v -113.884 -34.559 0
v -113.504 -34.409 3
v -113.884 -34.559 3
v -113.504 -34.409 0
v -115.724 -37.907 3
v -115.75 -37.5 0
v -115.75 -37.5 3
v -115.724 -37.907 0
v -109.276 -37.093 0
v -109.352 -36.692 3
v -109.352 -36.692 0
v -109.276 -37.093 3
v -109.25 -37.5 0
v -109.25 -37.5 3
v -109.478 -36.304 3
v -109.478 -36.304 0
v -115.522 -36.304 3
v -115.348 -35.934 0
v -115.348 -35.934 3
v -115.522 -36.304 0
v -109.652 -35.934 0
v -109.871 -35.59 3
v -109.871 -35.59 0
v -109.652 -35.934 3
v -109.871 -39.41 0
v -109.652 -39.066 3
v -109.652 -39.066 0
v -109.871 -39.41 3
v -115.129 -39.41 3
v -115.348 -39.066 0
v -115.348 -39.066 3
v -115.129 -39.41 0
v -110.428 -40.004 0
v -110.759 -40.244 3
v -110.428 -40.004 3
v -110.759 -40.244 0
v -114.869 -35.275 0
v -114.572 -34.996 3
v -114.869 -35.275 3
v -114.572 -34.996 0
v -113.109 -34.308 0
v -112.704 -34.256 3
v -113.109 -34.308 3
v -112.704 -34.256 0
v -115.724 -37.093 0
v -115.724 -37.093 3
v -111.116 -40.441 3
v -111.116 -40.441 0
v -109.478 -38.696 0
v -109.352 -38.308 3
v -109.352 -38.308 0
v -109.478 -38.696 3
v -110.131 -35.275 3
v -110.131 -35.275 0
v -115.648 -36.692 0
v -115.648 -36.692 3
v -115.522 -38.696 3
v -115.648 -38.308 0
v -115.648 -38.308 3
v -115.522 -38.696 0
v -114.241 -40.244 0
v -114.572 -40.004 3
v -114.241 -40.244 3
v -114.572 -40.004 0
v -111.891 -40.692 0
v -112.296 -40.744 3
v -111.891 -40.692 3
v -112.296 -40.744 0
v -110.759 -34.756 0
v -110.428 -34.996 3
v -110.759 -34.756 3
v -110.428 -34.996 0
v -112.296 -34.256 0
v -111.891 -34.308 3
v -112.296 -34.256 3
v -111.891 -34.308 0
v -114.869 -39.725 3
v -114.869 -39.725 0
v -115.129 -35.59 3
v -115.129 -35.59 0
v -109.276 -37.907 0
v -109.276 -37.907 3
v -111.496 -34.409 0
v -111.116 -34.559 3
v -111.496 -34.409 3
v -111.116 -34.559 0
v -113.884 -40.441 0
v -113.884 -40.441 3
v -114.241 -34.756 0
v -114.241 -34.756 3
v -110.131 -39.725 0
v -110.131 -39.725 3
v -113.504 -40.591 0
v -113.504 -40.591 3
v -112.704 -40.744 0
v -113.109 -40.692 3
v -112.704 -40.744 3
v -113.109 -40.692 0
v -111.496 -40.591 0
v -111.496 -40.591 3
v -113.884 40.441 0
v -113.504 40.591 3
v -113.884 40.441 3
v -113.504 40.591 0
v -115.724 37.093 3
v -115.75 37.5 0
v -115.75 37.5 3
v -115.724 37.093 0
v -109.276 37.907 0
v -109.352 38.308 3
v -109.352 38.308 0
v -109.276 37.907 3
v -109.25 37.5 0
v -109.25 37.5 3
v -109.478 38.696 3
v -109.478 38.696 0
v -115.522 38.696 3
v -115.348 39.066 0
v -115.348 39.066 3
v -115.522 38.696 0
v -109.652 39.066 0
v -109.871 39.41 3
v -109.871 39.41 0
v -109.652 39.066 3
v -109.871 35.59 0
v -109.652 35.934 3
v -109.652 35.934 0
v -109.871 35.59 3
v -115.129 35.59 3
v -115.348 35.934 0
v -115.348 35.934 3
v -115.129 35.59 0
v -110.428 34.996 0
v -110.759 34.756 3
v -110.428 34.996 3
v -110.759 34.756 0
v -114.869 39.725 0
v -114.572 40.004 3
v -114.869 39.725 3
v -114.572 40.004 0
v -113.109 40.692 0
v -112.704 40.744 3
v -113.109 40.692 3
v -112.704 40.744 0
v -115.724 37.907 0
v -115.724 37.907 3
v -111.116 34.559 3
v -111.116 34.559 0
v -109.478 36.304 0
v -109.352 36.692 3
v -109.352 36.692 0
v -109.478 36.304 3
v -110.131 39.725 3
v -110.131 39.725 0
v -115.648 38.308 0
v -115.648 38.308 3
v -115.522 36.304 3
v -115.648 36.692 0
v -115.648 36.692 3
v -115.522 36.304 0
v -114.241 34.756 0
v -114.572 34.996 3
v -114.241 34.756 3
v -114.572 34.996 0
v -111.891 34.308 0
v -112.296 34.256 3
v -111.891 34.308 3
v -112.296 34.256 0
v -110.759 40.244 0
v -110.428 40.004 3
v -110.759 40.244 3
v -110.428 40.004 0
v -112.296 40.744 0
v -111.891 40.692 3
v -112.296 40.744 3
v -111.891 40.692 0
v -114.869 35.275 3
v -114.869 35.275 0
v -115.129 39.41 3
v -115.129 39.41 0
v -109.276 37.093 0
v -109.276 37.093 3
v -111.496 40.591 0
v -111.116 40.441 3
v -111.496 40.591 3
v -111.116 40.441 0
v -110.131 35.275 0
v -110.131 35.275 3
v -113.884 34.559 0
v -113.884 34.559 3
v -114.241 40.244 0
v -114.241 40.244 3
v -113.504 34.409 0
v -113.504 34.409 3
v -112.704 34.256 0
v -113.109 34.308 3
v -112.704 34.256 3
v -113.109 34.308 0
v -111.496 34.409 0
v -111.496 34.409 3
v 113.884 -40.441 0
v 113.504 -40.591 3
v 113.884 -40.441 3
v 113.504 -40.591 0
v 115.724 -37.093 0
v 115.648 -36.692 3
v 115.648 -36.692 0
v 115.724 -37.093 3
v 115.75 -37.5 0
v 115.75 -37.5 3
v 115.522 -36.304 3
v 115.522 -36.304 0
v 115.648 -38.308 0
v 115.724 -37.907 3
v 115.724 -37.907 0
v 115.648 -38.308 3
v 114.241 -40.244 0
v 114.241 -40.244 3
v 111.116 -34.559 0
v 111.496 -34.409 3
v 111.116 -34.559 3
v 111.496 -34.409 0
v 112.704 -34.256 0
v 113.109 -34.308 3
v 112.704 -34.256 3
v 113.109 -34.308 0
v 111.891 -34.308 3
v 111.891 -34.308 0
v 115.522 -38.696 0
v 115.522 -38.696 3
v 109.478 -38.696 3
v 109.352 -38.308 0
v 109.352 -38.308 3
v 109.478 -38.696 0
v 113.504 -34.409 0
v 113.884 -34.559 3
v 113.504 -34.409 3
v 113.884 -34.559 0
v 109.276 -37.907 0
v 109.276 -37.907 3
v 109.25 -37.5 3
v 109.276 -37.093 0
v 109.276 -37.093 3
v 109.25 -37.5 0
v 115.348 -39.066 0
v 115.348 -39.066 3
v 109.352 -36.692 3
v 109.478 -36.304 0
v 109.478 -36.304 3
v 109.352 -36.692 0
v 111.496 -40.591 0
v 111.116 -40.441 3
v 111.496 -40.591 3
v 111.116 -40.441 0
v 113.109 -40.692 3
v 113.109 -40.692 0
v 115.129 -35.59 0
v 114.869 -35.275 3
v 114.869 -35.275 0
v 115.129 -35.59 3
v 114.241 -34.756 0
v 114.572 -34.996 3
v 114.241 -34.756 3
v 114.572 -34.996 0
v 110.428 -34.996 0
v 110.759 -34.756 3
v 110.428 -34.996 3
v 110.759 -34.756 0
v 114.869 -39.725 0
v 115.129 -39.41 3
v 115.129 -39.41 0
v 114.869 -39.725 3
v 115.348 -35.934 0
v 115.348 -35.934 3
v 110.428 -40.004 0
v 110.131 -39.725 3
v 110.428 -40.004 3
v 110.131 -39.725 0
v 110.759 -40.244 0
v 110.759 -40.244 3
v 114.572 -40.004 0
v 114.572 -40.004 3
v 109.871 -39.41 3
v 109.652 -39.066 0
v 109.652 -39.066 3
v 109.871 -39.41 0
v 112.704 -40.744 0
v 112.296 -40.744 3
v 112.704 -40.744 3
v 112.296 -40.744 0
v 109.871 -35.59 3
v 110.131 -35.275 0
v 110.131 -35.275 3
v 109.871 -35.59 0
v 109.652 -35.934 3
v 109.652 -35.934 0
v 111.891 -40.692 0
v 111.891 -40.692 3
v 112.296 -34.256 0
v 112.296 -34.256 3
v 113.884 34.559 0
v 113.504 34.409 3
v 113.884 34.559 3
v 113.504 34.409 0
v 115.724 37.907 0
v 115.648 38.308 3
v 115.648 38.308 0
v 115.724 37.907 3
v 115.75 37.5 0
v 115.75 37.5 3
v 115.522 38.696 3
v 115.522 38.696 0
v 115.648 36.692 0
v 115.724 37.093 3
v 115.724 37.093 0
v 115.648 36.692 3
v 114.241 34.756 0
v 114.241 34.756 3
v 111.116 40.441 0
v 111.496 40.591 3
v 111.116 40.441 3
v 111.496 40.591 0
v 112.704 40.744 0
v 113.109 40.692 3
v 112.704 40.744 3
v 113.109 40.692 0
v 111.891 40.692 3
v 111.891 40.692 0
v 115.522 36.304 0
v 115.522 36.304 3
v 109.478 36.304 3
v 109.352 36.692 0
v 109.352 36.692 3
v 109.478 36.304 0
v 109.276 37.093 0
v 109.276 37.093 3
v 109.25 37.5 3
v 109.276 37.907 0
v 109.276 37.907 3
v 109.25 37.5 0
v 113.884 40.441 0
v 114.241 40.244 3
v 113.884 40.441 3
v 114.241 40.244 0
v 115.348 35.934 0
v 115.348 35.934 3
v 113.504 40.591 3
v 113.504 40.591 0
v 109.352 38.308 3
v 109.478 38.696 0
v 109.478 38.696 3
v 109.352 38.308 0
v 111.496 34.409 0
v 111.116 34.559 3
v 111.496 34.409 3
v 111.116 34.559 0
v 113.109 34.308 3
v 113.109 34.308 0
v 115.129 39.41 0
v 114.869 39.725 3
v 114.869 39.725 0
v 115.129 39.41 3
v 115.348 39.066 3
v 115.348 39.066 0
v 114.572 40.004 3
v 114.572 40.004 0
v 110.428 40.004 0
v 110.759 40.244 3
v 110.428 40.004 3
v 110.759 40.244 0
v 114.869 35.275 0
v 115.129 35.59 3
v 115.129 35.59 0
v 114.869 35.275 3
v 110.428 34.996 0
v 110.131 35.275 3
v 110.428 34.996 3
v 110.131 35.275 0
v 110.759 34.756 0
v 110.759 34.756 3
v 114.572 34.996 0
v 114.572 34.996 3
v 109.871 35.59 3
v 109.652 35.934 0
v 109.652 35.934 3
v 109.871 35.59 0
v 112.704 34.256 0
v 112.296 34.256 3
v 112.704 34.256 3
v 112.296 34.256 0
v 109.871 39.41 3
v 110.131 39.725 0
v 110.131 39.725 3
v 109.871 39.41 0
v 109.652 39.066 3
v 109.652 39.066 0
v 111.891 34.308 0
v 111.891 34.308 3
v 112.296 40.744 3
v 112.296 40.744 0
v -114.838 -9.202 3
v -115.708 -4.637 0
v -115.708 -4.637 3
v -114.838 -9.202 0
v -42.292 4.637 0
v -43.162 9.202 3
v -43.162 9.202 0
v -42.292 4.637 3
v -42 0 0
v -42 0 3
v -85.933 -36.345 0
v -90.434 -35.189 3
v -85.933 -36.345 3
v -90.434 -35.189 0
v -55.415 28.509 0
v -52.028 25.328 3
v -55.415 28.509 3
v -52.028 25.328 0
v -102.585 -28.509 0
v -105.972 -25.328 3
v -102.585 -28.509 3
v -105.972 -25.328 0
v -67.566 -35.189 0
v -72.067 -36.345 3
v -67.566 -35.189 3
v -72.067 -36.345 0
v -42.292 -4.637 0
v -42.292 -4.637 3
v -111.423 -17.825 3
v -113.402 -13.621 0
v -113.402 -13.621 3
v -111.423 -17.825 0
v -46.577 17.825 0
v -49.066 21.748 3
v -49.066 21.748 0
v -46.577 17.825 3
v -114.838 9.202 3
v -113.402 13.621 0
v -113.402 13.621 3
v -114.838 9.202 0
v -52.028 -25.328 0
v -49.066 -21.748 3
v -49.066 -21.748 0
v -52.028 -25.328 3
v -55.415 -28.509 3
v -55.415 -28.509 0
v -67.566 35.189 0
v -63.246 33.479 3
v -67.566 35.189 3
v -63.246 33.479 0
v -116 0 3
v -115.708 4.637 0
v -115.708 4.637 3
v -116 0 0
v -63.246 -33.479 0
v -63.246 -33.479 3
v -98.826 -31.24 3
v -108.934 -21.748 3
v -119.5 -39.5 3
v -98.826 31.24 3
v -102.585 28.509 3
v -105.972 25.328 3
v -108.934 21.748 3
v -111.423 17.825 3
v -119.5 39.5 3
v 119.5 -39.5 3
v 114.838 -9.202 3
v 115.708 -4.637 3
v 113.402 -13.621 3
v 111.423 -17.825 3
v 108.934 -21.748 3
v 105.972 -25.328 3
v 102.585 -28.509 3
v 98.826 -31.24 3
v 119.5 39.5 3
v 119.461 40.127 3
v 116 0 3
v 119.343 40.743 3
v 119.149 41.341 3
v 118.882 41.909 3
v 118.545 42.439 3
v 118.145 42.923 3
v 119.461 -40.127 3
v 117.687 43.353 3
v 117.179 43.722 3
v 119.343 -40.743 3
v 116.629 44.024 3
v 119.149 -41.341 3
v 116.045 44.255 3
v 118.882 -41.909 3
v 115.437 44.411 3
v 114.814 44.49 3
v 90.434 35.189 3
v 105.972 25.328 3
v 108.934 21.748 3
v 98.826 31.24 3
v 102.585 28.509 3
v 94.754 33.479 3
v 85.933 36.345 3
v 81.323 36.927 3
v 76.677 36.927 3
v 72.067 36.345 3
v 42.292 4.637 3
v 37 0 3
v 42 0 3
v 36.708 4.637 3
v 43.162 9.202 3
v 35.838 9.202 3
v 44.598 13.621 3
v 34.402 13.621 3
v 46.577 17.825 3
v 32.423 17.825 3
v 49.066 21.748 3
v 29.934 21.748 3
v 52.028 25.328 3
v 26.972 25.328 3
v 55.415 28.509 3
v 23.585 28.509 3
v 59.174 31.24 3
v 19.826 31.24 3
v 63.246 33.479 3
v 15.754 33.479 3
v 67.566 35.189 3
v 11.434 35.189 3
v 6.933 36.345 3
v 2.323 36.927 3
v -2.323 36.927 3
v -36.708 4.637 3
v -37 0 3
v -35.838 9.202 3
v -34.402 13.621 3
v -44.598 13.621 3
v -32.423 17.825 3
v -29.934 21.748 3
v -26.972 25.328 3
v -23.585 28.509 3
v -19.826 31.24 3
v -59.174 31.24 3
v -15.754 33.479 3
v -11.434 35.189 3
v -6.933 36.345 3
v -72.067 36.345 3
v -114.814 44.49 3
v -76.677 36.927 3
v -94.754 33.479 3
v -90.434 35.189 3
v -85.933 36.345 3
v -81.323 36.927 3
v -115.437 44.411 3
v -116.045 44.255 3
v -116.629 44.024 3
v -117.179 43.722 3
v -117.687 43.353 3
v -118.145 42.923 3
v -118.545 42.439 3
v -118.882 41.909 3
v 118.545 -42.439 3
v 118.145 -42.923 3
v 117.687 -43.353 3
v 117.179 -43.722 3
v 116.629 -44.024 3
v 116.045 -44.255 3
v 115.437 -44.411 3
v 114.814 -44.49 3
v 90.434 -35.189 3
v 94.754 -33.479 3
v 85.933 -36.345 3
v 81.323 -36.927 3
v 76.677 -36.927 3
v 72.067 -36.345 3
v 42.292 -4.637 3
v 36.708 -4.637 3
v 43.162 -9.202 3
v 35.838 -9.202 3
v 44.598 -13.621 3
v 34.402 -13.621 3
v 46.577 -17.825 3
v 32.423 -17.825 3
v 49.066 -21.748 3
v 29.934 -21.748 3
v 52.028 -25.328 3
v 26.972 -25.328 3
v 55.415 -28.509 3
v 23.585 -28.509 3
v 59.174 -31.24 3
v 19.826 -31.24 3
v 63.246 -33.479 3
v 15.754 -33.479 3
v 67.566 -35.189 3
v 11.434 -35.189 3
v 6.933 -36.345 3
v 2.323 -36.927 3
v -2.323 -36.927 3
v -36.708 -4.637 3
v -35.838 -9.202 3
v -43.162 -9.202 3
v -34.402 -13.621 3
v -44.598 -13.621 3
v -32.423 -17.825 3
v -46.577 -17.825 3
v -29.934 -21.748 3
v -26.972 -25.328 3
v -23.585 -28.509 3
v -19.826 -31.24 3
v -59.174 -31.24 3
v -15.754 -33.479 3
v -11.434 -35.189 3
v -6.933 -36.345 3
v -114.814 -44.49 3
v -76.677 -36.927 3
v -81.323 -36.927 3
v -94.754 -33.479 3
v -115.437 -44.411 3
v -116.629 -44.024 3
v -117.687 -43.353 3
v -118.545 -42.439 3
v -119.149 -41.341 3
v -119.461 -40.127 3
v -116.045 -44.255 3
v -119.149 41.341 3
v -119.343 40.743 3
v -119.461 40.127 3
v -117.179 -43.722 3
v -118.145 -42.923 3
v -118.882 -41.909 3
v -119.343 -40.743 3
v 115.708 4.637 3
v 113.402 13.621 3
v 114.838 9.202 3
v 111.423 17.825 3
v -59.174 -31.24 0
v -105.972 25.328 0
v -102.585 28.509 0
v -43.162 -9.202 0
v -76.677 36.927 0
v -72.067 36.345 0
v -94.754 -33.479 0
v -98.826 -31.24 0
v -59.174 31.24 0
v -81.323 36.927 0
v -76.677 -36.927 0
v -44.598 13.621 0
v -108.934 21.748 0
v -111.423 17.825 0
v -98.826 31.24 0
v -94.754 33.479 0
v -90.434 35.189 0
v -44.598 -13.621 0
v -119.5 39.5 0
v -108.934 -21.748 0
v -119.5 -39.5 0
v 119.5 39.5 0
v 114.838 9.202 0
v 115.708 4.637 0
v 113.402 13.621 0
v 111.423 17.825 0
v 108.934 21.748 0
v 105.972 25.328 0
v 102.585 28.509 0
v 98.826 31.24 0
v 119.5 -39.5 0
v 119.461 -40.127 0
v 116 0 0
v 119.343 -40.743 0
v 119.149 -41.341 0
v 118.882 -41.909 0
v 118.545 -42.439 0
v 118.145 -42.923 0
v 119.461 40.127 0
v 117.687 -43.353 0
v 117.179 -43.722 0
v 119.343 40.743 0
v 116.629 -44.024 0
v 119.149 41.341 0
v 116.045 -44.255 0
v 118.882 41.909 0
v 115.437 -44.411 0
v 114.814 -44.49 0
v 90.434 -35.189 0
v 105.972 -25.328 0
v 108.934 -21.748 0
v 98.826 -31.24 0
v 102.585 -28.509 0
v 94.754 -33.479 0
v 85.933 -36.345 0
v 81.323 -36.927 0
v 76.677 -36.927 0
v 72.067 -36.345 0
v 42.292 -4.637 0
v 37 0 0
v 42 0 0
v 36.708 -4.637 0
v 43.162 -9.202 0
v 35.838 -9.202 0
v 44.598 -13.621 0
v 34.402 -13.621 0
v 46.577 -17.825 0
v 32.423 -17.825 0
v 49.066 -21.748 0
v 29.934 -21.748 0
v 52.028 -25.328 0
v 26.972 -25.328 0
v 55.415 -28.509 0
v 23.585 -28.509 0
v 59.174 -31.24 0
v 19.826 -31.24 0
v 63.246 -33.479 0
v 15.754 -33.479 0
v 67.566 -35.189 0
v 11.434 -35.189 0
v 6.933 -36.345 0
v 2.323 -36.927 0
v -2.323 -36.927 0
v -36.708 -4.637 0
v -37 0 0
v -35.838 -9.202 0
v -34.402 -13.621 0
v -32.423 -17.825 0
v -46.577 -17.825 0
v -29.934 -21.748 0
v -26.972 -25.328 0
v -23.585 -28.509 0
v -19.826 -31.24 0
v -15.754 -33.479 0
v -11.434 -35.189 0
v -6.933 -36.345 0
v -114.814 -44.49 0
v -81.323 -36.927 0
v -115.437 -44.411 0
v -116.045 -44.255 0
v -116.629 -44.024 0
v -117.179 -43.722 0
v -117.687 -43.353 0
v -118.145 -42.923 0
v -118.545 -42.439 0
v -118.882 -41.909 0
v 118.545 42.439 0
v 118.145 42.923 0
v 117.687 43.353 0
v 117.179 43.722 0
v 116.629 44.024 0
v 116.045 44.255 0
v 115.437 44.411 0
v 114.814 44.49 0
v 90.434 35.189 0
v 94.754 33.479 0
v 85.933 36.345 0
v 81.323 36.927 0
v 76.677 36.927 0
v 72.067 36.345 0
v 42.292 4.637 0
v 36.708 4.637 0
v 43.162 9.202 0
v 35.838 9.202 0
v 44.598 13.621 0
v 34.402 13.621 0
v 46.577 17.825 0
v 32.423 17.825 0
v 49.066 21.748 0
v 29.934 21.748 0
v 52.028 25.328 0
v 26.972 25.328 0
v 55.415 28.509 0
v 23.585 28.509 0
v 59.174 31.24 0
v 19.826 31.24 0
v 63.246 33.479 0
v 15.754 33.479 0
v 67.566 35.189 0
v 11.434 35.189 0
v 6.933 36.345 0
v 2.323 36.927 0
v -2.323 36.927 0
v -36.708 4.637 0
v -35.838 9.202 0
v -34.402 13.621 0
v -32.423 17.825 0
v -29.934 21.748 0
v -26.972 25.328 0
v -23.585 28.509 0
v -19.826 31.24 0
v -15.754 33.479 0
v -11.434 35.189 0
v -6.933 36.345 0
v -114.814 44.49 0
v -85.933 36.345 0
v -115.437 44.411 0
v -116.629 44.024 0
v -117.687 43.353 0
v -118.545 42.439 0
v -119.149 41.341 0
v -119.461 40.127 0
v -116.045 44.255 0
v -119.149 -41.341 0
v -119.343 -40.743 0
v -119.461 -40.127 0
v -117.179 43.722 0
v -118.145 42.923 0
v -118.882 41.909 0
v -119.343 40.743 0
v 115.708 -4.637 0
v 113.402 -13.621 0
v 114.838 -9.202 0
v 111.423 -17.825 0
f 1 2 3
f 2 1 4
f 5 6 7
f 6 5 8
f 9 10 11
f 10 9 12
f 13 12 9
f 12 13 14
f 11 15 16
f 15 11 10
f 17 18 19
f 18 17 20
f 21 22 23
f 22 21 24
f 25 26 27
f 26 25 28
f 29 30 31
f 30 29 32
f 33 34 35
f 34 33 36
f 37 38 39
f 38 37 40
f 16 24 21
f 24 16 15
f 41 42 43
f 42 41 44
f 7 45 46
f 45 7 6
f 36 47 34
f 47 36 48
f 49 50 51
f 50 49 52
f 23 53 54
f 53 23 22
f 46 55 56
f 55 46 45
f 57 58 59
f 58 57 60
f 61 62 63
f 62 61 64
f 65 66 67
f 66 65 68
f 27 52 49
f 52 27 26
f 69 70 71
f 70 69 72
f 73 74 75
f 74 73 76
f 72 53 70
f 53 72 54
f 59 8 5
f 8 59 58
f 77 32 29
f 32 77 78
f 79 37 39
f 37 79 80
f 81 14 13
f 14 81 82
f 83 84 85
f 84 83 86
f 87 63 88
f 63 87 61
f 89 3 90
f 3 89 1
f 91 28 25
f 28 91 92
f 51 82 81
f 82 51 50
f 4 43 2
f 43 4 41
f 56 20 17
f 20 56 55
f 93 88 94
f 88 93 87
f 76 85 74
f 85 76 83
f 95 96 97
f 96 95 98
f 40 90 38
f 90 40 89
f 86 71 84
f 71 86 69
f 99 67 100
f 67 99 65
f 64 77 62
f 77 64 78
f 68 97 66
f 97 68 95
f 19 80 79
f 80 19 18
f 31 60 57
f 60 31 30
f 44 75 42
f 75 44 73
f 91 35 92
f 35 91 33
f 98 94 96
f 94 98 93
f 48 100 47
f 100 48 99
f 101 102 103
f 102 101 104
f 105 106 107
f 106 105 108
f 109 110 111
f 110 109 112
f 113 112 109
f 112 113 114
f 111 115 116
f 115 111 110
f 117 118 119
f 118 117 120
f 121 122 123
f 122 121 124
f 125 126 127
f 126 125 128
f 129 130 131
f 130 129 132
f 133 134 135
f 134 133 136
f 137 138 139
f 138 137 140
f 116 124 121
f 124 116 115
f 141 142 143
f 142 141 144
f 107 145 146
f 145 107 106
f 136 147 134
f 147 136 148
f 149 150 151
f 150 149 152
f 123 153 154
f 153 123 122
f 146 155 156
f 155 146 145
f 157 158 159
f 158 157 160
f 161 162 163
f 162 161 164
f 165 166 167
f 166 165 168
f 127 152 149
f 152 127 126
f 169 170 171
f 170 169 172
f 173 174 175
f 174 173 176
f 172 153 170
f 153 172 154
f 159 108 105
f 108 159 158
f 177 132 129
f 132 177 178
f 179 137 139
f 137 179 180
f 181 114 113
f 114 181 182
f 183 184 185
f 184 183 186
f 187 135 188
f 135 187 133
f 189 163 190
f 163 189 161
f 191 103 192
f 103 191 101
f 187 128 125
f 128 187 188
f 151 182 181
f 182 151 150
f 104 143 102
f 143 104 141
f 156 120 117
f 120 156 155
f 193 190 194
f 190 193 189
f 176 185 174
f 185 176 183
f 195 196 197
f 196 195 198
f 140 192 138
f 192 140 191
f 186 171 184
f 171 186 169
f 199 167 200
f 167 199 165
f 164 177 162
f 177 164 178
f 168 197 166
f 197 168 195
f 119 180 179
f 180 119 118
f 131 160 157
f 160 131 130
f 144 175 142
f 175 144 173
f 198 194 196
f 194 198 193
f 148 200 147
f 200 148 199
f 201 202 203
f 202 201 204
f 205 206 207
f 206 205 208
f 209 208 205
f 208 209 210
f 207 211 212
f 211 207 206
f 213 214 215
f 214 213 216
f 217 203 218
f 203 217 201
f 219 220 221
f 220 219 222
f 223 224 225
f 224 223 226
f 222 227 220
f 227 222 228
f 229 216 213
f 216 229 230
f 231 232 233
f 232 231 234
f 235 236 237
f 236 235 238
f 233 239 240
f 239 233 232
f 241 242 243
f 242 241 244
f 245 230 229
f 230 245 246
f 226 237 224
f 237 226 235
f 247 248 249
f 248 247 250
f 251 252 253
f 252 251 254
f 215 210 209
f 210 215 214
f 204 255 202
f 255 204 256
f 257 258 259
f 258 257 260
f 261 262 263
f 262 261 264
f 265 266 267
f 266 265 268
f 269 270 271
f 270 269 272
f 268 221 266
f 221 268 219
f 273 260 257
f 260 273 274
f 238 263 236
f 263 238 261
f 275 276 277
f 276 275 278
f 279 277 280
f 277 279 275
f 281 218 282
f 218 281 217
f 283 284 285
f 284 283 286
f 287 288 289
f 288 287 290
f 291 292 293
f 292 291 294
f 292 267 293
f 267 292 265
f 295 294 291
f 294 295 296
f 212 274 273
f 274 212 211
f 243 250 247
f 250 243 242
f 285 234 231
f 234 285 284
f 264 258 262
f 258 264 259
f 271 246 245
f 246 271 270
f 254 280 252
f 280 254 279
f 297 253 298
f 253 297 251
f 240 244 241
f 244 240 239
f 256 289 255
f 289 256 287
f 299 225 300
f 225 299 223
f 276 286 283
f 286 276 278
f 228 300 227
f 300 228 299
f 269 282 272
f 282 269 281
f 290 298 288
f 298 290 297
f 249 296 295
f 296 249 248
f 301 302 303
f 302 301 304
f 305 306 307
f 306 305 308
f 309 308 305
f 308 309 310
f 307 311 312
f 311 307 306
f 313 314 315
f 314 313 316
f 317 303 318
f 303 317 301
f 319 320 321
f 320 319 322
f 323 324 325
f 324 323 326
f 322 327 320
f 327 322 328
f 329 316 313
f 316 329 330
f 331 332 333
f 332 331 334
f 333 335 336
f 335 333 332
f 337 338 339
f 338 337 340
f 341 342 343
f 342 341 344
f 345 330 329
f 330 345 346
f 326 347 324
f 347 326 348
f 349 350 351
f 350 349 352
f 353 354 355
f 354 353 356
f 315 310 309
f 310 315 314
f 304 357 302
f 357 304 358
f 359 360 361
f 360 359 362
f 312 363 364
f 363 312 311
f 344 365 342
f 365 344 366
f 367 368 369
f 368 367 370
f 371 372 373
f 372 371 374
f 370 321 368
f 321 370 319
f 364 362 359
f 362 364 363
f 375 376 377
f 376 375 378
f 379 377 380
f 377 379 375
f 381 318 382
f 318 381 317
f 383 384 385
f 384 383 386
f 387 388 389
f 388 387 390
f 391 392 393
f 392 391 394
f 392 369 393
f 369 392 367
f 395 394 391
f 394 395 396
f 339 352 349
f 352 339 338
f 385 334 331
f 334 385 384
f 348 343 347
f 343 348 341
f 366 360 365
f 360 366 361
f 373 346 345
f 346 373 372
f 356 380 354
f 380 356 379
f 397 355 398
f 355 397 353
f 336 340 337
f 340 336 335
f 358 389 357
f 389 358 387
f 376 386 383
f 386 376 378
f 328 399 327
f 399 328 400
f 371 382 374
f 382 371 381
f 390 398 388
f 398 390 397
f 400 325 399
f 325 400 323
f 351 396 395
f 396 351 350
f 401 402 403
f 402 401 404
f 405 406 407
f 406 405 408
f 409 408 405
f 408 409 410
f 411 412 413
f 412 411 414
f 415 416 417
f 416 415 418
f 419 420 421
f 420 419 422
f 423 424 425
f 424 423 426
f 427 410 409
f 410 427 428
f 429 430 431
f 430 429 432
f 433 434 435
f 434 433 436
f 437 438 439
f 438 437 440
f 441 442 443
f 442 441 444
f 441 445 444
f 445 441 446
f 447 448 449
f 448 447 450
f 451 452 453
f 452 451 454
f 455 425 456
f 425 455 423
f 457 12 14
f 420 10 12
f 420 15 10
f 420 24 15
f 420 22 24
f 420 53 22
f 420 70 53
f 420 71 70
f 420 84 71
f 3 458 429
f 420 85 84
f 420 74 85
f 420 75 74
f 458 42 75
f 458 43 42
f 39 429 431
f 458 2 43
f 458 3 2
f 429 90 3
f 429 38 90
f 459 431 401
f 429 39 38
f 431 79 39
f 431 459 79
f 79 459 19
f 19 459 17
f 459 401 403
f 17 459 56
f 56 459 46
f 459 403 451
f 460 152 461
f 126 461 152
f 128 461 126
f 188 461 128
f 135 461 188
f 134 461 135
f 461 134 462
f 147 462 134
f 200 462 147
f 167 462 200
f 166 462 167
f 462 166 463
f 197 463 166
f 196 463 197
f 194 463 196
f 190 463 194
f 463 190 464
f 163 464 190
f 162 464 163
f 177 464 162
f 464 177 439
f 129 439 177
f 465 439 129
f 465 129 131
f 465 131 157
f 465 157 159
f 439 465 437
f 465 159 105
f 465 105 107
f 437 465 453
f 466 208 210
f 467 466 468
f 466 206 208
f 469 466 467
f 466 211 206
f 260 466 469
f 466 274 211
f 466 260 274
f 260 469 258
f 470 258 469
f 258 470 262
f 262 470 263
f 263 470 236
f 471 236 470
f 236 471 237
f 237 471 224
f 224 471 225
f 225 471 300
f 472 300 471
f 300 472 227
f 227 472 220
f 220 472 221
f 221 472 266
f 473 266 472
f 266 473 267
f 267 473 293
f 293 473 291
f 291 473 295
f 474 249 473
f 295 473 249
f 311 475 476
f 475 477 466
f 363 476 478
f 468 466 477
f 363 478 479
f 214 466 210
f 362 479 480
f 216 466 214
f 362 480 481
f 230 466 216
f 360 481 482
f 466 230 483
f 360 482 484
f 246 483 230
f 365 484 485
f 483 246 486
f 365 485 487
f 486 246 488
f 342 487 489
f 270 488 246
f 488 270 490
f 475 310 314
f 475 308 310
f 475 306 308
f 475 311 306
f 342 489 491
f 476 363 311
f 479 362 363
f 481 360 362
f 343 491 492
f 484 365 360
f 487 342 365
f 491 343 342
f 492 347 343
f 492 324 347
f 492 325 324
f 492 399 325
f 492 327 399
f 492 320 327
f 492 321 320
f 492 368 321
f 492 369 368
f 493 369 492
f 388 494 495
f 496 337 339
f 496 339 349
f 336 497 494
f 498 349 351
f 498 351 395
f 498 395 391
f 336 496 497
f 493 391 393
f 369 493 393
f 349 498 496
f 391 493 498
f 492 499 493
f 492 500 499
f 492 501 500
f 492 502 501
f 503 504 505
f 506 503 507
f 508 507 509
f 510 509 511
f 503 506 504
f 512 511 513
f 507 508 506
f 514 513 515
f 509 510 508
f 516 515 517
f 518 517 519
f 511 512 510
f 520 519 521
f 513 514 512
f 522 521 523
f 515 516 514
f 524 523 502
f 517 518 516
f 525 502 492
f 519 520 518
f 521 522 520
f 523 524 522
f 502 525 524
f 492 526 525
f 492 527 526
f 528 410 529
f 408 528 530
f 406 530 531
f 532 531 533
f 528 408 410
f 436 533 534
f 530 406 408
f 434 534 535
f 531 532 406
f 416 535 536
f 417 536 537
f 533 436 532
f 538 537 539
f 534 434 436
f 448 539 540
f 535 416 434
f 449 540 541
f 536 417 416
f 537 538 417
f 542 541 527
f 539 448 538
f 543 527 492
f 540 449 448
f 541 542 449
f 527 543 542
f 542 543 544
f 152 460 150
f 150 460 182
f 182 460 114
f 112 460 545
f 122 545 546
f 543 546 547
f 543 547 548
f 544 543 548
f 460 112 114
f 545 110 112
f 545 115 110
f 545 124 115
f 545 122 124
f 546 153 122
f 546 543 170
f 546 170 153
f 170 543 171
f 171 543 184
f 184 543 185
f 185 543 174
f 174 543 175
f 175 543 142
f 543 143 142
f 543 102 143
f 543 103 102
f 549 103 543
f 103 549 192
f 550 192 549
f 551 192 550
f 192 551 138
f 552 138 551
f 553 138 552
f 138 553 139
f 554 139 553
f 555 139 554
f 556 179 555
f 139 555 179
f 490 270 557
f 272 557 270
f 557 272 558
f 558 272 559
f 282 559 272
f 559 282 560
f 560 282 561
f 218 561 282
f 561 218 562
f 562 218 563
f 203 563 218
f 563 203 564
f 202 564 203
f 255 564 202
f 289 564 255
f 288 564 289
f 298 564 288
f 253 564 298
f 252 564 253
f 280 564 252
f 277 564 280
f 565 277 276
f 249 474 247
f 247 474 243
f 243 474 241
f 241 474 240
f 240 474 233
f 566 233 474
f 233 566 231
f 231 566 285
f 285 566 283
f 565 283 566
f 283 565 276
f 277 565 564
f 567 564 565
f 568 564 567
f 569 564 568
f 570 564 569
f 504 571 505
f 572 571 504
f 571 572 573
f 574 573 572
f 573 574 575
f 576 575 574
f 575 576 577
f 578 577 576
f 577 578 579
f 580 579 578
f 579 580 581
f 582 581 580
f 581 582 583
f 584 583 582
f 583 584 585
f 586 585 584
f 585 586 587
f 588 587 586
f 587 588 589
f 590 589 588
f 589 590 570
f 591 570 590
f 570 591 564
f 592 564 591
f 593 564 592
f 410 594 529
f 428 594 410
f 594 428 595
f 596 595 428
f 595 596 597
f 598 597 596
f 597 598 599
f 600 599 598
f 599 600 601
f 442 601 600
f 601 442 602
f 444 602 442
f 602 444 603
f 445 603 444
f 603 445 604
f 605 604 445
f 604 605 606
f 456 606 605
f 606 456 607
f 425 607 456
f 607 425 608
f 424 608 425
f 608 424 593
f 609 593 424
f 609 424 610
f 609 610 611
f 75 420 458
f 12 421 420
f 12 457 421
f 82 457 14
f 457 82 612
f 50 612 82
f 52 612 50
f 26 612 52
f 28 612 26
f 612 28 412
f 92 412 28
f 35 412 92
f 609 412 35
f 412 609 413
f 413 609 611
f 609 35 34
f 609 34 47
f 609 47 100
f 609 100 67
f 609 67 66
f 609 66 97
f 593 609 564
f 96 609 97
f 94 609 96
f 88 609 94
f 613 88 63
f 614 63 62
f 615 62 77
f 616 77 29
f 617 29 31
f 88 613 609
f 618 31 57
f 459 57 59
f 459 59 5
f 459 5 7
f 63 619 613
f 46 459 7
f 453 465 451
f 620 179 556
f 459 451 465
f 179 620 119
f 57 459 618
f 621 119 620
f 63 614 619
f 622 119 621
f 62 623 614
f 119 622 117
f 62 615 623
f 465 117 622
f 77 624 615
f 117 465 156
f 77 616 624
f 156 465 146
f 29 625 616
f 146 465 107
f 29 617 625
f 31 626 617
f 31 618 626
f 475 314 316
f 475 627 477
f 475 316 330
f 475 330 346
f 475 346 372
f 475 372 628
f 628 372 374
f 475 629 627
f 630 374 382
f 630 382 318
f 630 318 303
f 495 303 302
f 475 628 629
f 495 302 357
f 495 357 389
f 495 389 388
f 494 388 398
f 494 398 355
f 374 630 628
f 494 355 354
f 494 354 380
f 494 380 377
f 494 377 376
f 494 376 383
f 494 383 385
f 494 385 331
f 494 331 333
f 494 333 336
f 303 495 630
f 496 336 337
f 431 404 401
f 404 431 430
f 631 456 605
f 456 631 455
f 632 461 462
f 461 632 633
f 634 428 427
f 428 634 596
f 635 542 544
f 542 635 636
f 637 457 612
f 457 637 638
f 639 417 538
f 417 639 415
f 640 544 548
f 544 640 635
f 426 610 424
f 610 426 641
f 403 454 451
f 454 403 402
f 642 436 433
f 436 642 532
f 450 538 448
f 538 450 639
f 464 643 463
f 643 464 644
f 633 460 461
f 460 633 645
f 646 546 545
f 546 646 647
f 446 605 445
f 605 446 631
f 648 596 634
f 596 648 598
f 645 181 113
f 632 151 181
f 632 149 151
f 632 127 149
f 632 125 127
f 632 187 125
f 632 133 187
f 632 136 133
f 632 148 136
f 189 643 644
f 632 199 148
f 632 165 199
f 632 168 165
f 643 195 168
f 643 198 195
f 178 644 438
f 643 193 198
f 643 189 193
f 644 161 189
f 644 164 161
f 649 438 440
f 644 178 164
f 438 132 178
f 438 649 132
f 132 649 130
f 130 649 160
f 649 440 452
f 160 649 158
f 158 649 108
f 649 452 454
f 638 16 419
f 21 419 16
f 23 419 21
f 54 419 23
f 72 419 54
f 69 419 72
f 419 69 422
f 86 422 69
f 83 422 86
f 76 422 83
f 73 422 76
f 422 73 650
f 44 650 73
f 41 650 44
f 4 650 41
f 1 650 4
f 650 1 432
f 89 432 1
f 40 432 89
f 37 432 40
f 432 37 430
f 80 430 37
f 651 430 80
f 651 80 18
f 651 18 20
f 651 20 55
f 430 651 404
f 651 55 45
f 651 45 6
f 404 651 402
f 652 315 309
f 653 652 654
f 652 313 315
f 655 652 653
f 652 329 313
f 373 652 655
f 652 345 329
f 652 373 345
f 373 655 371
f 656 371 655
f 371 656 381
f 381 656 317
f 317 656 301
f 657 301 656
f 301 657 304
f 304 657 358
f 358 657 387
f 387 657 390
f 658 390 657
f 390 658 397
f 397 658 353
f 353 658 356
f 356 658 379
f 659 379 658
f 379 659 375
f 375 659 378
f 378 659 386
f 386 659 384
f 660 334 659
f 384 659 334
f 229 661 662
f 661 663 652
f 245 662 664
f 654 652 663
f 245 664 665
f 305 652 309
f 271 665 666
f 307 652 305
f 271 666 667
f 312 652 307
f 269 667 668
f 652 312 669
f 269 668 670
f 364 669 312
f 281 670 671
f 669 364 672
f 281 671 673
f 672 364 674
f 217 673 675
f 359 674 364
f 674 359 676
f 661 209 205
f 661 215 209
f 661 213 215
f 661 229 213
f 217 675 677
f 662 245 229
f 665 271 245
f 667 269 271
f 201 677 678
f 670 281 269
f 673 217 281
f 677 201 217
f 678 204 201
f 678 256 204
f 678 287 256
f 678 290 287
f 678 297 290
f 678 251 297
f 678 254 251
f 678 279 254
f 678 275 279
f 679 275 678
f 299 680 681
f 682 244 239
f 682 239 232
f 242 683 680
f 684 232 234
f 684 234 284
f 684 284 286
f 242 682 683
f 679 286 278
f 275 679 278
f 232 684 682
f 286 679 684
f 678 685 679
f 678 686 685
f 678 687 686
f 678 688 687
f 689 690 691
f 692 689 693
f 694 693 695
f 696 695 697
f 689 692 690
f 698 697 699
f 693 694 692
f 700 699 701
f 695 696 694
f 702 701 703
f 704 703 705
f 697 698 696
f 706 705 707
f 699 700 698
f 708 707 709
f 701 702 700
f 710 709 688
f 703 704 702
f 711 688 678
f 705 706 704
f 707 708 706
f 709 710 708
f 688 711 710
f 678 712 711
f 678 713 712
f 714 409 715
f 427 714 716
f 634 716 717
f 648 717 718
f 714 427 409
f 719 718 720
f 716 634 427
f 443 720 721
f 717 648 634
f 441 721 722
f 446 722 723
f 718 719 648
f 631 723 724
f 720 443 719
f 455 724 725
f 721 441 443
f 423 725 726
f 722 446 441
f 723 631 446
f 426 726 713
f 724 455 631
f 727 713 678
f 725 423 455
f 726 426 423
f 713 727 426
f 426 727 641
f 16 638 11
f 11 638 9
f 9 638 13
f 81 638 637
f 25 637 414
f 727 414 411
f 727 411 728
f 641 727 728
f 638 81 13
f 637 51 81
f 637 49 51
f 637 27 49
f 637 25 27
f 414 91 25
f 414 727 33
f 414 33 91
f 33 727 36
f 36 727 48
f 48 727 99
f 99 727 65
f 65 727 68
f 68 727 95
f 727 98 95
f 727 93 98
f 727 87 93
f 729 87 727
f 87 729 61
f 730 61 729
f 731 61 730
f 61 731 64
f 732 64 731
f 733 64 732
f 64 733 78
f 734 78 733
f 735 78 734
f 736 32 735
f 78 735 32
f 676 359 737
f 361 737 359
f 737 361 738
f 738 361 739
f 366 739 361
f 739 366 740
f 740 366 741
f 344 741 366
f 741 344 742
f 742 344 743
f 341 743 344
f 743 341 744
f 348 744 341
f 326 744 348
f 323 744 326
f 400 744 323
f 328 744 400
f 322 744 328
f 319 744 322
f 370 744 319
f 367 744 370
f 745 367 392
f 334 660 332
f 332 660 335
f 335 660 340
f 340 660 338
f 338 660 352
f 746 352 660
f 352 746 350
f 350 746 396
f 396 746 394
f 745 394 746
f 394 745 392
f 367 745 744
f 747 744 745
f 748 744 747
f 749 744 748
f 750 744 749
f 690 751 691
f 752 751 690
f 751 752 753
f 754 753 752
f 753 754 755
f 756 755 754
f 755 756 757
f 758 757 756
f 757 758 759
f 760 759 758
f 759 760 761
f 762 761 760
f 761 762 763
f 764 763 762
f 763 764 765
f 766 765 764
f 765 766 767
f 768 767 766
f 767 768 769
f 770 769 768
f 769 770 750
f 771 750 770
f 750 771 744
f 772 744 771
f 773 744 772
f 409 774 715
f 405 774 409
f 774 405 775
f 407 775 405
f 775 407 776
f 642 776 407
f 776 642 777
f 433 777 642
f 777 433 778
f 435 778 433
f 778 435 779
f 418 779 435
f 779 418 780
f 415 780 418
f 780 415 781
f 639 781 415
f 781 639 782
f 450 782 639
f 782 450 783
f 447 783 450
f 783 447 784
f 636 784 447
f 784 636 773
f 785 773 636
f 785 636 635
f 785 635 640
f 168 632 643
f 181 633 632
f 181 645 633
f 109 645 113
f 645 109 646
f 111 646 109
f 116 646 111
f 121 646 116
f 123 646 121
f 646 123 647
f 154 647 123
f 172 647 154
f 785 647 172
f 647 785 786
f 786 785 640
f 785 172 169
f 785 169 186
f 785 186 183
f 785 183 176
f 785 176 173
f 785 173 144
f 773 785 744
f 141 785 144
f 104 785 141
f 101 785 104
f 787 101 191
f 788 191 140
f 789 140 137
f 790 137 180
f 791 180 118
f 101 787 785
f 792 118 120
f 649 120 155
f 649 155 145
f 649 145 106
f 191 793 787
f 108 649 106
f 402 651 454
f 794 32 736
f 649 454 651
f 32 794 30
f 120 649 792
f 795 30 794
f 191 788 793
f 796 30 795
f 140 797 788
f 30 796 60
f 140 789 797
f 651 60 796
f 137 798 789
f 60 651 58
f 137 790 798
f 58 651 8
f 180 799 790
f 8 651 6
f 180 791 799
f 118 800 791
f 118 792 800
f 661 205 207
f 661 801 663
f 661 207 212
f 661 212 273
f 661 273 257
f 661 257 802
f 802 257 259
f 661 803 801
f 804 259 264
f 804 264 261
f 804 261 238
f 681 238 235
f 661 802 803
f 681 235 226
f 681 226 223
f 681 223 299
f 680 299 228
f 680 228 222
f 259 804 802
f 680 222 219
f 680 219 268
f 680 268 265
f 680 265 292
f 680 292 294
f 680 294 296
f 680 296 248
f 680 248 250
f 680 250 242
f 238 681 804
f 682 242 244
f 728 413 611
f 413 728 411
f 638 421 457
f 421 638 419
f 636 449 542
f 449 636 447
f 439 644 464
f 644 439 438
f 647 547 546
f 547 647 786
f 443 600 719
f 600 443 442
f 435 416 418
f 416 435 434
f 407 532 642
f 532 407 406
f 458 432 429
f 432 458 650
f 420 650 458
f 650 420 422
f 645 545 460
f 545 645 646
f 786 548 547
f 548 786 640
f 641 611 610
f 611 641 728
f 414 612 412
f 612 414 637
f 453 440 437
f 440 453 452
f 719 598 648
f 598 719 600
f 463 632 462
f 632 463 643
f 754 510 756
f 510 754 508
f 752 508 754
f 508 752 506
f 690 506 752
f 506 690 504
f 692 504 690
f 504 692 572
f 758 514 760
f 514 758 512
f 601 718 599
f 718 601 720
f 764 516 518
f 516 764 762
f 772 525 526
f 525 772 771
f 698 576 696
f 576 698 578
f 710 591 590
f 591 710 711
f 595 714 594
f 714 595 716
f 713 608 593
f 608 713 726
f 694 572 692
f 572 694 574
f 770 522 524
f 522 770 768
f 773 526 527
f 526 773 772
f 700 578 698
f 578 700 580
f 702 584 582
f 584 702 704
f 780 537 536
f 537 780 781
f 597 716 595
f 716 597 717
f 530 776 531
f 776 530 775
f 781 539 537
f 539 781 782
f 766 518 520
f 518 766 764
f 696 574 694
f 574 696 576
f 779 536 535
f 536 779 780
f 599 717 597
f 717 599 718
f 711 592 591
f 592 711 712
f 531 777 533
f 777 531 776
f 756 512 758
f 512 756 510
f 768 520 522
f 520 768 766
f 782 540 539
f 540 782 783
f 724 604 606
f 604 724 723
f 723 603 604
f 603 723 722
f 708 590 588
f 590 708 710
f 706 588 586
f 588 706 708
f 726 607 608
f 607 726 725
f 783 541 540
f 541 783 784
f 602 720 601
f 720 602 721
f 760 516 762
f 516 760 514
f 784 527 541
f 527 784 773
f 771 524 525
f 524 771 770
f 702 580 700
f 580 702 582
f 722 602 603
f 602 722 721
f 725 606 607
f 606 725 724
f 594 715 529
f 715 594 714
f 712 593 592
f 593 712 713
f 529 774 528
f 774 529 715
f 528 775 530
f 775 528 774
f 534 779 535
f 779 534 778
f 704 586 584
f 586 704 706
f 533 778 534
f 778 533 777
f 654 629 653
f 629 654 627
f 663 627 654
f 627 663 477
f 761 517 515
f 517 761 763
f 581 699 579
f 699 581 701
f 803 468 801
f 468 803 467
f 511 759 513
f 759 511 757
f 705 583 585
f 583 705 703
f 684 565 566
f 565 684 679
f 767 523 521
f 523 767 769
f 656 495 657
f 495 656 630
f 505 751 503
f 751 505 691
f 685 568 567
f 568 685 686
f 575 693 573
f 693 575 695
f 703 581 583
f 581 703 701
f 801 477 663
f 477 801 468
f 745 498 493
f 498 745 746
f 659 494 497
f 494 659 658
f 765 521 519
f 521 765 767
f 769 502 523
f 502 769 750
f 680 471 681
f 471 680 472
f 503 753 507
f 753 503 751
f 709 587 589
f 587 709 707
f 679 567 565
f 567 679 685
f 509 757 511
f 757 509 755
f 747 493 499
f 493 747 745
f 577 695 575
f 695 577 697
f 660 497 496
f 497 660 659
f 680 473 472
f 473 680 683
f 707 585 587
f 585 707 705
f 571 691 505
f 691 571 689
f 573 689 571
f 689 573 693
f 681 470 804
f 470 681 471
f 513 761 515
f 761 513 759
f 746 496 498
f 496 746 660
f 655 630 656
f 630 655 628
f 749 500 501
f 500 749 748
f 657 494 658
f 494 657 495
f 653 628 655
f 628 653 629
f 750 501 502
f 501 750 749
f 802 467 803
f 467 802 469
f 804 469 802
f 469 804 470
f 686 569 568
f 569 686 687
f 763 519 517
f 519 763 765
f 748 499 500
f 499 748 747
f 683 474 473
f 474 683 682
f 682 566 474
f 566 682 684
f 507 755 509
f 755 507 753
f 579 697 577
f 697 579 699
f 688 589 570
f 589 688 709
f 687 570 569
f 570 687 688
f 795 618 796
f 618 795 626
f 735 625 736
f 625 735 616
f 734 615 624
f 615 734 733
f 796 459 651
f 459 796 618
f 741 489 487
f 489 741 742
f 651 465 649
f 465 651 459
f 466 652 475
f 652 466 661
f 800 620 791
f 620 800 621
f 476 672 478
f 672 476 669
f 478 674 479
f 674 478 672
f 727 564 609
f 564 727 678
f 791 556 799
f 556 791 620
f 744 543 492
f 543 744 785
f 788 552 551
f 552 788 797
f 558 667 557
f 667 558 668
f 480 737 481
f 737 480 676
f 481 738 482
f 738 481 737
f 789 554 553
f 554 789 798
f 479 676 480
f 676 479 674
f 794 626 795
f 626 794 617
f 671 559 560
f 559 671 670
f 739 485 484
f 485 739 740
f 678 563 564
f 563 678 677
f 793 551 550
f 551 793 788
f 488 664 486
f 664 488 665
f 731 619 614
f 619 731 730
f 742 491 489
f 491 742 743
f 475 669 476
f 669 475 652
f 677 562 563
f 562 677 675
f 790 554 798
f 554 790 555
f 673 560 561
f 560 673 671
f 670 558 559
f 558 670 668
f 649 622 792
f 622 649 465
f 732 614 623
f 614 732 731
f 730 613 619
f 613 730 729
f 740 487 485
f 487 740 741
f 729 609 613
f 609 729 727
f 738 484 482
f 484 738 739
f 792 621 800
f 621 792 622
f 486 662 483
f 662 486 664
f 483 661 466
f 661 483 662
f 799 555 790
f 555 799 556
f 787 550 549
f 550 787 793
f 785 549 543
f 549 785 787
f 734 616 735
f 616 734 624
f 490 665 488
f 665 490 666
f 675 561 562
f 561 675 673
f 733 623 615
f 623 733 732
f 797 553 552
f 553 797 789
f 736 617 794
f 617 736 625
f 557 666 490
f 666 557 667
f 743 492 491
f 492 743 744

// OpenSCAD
$fn = 50;


difference() {
	union() {
		hull() {
			translate(v = [-114.5000000000, 39.5000000000, 0]) {
				cylinder(h = 3, r = 5);
			}
			translate(v = [114.5000000000, 39.5000000000, 0]) {
				cylinder(h = 3, r = 5);
			}
			translate(v = [-114.5000000000, -39.5000000000, 0]) {
				cylinder(h = 3, r = 5);
			}
			translate(v = [114.5000000000, -39.5000000000, 0]) {
				cylinder(h = 3, r = 5);
			}
		}
	}
	union() {
		#translate(v = [-112.5000000000, -37.5000000000, -100.0000000000]) {
			cylinder(h = 200, r = 3.2500000000);
		}
		#translate(v = [-112.5000000000, 37.5000000000, -100.0000000000]) {
			cylinder(h = 200, r = 3.2500000000);
		}
		#translate(v = [112.5000000000, -37.5000000000, -100.0000000000]) {
			cylinder(h = 200, r = 3.2500000000);
		}
		#translate(v = [112.5000000000, 37.5000000000, -100.0000000000]) {
			cylinder(h = 200, r = 3.2500000000);
		}
		#translate(v = [-79.0000000000, 0, 0]) {
			cylinder(h = 3, r = 37.0000000000);
		}
		#cylinder(h = 3, r = 37.0000000000);
		#translate(v = [79.0000000000, 0, 0]) {
			cylinder(h = 3, r = 37.0000000000);
		}
	}
}
